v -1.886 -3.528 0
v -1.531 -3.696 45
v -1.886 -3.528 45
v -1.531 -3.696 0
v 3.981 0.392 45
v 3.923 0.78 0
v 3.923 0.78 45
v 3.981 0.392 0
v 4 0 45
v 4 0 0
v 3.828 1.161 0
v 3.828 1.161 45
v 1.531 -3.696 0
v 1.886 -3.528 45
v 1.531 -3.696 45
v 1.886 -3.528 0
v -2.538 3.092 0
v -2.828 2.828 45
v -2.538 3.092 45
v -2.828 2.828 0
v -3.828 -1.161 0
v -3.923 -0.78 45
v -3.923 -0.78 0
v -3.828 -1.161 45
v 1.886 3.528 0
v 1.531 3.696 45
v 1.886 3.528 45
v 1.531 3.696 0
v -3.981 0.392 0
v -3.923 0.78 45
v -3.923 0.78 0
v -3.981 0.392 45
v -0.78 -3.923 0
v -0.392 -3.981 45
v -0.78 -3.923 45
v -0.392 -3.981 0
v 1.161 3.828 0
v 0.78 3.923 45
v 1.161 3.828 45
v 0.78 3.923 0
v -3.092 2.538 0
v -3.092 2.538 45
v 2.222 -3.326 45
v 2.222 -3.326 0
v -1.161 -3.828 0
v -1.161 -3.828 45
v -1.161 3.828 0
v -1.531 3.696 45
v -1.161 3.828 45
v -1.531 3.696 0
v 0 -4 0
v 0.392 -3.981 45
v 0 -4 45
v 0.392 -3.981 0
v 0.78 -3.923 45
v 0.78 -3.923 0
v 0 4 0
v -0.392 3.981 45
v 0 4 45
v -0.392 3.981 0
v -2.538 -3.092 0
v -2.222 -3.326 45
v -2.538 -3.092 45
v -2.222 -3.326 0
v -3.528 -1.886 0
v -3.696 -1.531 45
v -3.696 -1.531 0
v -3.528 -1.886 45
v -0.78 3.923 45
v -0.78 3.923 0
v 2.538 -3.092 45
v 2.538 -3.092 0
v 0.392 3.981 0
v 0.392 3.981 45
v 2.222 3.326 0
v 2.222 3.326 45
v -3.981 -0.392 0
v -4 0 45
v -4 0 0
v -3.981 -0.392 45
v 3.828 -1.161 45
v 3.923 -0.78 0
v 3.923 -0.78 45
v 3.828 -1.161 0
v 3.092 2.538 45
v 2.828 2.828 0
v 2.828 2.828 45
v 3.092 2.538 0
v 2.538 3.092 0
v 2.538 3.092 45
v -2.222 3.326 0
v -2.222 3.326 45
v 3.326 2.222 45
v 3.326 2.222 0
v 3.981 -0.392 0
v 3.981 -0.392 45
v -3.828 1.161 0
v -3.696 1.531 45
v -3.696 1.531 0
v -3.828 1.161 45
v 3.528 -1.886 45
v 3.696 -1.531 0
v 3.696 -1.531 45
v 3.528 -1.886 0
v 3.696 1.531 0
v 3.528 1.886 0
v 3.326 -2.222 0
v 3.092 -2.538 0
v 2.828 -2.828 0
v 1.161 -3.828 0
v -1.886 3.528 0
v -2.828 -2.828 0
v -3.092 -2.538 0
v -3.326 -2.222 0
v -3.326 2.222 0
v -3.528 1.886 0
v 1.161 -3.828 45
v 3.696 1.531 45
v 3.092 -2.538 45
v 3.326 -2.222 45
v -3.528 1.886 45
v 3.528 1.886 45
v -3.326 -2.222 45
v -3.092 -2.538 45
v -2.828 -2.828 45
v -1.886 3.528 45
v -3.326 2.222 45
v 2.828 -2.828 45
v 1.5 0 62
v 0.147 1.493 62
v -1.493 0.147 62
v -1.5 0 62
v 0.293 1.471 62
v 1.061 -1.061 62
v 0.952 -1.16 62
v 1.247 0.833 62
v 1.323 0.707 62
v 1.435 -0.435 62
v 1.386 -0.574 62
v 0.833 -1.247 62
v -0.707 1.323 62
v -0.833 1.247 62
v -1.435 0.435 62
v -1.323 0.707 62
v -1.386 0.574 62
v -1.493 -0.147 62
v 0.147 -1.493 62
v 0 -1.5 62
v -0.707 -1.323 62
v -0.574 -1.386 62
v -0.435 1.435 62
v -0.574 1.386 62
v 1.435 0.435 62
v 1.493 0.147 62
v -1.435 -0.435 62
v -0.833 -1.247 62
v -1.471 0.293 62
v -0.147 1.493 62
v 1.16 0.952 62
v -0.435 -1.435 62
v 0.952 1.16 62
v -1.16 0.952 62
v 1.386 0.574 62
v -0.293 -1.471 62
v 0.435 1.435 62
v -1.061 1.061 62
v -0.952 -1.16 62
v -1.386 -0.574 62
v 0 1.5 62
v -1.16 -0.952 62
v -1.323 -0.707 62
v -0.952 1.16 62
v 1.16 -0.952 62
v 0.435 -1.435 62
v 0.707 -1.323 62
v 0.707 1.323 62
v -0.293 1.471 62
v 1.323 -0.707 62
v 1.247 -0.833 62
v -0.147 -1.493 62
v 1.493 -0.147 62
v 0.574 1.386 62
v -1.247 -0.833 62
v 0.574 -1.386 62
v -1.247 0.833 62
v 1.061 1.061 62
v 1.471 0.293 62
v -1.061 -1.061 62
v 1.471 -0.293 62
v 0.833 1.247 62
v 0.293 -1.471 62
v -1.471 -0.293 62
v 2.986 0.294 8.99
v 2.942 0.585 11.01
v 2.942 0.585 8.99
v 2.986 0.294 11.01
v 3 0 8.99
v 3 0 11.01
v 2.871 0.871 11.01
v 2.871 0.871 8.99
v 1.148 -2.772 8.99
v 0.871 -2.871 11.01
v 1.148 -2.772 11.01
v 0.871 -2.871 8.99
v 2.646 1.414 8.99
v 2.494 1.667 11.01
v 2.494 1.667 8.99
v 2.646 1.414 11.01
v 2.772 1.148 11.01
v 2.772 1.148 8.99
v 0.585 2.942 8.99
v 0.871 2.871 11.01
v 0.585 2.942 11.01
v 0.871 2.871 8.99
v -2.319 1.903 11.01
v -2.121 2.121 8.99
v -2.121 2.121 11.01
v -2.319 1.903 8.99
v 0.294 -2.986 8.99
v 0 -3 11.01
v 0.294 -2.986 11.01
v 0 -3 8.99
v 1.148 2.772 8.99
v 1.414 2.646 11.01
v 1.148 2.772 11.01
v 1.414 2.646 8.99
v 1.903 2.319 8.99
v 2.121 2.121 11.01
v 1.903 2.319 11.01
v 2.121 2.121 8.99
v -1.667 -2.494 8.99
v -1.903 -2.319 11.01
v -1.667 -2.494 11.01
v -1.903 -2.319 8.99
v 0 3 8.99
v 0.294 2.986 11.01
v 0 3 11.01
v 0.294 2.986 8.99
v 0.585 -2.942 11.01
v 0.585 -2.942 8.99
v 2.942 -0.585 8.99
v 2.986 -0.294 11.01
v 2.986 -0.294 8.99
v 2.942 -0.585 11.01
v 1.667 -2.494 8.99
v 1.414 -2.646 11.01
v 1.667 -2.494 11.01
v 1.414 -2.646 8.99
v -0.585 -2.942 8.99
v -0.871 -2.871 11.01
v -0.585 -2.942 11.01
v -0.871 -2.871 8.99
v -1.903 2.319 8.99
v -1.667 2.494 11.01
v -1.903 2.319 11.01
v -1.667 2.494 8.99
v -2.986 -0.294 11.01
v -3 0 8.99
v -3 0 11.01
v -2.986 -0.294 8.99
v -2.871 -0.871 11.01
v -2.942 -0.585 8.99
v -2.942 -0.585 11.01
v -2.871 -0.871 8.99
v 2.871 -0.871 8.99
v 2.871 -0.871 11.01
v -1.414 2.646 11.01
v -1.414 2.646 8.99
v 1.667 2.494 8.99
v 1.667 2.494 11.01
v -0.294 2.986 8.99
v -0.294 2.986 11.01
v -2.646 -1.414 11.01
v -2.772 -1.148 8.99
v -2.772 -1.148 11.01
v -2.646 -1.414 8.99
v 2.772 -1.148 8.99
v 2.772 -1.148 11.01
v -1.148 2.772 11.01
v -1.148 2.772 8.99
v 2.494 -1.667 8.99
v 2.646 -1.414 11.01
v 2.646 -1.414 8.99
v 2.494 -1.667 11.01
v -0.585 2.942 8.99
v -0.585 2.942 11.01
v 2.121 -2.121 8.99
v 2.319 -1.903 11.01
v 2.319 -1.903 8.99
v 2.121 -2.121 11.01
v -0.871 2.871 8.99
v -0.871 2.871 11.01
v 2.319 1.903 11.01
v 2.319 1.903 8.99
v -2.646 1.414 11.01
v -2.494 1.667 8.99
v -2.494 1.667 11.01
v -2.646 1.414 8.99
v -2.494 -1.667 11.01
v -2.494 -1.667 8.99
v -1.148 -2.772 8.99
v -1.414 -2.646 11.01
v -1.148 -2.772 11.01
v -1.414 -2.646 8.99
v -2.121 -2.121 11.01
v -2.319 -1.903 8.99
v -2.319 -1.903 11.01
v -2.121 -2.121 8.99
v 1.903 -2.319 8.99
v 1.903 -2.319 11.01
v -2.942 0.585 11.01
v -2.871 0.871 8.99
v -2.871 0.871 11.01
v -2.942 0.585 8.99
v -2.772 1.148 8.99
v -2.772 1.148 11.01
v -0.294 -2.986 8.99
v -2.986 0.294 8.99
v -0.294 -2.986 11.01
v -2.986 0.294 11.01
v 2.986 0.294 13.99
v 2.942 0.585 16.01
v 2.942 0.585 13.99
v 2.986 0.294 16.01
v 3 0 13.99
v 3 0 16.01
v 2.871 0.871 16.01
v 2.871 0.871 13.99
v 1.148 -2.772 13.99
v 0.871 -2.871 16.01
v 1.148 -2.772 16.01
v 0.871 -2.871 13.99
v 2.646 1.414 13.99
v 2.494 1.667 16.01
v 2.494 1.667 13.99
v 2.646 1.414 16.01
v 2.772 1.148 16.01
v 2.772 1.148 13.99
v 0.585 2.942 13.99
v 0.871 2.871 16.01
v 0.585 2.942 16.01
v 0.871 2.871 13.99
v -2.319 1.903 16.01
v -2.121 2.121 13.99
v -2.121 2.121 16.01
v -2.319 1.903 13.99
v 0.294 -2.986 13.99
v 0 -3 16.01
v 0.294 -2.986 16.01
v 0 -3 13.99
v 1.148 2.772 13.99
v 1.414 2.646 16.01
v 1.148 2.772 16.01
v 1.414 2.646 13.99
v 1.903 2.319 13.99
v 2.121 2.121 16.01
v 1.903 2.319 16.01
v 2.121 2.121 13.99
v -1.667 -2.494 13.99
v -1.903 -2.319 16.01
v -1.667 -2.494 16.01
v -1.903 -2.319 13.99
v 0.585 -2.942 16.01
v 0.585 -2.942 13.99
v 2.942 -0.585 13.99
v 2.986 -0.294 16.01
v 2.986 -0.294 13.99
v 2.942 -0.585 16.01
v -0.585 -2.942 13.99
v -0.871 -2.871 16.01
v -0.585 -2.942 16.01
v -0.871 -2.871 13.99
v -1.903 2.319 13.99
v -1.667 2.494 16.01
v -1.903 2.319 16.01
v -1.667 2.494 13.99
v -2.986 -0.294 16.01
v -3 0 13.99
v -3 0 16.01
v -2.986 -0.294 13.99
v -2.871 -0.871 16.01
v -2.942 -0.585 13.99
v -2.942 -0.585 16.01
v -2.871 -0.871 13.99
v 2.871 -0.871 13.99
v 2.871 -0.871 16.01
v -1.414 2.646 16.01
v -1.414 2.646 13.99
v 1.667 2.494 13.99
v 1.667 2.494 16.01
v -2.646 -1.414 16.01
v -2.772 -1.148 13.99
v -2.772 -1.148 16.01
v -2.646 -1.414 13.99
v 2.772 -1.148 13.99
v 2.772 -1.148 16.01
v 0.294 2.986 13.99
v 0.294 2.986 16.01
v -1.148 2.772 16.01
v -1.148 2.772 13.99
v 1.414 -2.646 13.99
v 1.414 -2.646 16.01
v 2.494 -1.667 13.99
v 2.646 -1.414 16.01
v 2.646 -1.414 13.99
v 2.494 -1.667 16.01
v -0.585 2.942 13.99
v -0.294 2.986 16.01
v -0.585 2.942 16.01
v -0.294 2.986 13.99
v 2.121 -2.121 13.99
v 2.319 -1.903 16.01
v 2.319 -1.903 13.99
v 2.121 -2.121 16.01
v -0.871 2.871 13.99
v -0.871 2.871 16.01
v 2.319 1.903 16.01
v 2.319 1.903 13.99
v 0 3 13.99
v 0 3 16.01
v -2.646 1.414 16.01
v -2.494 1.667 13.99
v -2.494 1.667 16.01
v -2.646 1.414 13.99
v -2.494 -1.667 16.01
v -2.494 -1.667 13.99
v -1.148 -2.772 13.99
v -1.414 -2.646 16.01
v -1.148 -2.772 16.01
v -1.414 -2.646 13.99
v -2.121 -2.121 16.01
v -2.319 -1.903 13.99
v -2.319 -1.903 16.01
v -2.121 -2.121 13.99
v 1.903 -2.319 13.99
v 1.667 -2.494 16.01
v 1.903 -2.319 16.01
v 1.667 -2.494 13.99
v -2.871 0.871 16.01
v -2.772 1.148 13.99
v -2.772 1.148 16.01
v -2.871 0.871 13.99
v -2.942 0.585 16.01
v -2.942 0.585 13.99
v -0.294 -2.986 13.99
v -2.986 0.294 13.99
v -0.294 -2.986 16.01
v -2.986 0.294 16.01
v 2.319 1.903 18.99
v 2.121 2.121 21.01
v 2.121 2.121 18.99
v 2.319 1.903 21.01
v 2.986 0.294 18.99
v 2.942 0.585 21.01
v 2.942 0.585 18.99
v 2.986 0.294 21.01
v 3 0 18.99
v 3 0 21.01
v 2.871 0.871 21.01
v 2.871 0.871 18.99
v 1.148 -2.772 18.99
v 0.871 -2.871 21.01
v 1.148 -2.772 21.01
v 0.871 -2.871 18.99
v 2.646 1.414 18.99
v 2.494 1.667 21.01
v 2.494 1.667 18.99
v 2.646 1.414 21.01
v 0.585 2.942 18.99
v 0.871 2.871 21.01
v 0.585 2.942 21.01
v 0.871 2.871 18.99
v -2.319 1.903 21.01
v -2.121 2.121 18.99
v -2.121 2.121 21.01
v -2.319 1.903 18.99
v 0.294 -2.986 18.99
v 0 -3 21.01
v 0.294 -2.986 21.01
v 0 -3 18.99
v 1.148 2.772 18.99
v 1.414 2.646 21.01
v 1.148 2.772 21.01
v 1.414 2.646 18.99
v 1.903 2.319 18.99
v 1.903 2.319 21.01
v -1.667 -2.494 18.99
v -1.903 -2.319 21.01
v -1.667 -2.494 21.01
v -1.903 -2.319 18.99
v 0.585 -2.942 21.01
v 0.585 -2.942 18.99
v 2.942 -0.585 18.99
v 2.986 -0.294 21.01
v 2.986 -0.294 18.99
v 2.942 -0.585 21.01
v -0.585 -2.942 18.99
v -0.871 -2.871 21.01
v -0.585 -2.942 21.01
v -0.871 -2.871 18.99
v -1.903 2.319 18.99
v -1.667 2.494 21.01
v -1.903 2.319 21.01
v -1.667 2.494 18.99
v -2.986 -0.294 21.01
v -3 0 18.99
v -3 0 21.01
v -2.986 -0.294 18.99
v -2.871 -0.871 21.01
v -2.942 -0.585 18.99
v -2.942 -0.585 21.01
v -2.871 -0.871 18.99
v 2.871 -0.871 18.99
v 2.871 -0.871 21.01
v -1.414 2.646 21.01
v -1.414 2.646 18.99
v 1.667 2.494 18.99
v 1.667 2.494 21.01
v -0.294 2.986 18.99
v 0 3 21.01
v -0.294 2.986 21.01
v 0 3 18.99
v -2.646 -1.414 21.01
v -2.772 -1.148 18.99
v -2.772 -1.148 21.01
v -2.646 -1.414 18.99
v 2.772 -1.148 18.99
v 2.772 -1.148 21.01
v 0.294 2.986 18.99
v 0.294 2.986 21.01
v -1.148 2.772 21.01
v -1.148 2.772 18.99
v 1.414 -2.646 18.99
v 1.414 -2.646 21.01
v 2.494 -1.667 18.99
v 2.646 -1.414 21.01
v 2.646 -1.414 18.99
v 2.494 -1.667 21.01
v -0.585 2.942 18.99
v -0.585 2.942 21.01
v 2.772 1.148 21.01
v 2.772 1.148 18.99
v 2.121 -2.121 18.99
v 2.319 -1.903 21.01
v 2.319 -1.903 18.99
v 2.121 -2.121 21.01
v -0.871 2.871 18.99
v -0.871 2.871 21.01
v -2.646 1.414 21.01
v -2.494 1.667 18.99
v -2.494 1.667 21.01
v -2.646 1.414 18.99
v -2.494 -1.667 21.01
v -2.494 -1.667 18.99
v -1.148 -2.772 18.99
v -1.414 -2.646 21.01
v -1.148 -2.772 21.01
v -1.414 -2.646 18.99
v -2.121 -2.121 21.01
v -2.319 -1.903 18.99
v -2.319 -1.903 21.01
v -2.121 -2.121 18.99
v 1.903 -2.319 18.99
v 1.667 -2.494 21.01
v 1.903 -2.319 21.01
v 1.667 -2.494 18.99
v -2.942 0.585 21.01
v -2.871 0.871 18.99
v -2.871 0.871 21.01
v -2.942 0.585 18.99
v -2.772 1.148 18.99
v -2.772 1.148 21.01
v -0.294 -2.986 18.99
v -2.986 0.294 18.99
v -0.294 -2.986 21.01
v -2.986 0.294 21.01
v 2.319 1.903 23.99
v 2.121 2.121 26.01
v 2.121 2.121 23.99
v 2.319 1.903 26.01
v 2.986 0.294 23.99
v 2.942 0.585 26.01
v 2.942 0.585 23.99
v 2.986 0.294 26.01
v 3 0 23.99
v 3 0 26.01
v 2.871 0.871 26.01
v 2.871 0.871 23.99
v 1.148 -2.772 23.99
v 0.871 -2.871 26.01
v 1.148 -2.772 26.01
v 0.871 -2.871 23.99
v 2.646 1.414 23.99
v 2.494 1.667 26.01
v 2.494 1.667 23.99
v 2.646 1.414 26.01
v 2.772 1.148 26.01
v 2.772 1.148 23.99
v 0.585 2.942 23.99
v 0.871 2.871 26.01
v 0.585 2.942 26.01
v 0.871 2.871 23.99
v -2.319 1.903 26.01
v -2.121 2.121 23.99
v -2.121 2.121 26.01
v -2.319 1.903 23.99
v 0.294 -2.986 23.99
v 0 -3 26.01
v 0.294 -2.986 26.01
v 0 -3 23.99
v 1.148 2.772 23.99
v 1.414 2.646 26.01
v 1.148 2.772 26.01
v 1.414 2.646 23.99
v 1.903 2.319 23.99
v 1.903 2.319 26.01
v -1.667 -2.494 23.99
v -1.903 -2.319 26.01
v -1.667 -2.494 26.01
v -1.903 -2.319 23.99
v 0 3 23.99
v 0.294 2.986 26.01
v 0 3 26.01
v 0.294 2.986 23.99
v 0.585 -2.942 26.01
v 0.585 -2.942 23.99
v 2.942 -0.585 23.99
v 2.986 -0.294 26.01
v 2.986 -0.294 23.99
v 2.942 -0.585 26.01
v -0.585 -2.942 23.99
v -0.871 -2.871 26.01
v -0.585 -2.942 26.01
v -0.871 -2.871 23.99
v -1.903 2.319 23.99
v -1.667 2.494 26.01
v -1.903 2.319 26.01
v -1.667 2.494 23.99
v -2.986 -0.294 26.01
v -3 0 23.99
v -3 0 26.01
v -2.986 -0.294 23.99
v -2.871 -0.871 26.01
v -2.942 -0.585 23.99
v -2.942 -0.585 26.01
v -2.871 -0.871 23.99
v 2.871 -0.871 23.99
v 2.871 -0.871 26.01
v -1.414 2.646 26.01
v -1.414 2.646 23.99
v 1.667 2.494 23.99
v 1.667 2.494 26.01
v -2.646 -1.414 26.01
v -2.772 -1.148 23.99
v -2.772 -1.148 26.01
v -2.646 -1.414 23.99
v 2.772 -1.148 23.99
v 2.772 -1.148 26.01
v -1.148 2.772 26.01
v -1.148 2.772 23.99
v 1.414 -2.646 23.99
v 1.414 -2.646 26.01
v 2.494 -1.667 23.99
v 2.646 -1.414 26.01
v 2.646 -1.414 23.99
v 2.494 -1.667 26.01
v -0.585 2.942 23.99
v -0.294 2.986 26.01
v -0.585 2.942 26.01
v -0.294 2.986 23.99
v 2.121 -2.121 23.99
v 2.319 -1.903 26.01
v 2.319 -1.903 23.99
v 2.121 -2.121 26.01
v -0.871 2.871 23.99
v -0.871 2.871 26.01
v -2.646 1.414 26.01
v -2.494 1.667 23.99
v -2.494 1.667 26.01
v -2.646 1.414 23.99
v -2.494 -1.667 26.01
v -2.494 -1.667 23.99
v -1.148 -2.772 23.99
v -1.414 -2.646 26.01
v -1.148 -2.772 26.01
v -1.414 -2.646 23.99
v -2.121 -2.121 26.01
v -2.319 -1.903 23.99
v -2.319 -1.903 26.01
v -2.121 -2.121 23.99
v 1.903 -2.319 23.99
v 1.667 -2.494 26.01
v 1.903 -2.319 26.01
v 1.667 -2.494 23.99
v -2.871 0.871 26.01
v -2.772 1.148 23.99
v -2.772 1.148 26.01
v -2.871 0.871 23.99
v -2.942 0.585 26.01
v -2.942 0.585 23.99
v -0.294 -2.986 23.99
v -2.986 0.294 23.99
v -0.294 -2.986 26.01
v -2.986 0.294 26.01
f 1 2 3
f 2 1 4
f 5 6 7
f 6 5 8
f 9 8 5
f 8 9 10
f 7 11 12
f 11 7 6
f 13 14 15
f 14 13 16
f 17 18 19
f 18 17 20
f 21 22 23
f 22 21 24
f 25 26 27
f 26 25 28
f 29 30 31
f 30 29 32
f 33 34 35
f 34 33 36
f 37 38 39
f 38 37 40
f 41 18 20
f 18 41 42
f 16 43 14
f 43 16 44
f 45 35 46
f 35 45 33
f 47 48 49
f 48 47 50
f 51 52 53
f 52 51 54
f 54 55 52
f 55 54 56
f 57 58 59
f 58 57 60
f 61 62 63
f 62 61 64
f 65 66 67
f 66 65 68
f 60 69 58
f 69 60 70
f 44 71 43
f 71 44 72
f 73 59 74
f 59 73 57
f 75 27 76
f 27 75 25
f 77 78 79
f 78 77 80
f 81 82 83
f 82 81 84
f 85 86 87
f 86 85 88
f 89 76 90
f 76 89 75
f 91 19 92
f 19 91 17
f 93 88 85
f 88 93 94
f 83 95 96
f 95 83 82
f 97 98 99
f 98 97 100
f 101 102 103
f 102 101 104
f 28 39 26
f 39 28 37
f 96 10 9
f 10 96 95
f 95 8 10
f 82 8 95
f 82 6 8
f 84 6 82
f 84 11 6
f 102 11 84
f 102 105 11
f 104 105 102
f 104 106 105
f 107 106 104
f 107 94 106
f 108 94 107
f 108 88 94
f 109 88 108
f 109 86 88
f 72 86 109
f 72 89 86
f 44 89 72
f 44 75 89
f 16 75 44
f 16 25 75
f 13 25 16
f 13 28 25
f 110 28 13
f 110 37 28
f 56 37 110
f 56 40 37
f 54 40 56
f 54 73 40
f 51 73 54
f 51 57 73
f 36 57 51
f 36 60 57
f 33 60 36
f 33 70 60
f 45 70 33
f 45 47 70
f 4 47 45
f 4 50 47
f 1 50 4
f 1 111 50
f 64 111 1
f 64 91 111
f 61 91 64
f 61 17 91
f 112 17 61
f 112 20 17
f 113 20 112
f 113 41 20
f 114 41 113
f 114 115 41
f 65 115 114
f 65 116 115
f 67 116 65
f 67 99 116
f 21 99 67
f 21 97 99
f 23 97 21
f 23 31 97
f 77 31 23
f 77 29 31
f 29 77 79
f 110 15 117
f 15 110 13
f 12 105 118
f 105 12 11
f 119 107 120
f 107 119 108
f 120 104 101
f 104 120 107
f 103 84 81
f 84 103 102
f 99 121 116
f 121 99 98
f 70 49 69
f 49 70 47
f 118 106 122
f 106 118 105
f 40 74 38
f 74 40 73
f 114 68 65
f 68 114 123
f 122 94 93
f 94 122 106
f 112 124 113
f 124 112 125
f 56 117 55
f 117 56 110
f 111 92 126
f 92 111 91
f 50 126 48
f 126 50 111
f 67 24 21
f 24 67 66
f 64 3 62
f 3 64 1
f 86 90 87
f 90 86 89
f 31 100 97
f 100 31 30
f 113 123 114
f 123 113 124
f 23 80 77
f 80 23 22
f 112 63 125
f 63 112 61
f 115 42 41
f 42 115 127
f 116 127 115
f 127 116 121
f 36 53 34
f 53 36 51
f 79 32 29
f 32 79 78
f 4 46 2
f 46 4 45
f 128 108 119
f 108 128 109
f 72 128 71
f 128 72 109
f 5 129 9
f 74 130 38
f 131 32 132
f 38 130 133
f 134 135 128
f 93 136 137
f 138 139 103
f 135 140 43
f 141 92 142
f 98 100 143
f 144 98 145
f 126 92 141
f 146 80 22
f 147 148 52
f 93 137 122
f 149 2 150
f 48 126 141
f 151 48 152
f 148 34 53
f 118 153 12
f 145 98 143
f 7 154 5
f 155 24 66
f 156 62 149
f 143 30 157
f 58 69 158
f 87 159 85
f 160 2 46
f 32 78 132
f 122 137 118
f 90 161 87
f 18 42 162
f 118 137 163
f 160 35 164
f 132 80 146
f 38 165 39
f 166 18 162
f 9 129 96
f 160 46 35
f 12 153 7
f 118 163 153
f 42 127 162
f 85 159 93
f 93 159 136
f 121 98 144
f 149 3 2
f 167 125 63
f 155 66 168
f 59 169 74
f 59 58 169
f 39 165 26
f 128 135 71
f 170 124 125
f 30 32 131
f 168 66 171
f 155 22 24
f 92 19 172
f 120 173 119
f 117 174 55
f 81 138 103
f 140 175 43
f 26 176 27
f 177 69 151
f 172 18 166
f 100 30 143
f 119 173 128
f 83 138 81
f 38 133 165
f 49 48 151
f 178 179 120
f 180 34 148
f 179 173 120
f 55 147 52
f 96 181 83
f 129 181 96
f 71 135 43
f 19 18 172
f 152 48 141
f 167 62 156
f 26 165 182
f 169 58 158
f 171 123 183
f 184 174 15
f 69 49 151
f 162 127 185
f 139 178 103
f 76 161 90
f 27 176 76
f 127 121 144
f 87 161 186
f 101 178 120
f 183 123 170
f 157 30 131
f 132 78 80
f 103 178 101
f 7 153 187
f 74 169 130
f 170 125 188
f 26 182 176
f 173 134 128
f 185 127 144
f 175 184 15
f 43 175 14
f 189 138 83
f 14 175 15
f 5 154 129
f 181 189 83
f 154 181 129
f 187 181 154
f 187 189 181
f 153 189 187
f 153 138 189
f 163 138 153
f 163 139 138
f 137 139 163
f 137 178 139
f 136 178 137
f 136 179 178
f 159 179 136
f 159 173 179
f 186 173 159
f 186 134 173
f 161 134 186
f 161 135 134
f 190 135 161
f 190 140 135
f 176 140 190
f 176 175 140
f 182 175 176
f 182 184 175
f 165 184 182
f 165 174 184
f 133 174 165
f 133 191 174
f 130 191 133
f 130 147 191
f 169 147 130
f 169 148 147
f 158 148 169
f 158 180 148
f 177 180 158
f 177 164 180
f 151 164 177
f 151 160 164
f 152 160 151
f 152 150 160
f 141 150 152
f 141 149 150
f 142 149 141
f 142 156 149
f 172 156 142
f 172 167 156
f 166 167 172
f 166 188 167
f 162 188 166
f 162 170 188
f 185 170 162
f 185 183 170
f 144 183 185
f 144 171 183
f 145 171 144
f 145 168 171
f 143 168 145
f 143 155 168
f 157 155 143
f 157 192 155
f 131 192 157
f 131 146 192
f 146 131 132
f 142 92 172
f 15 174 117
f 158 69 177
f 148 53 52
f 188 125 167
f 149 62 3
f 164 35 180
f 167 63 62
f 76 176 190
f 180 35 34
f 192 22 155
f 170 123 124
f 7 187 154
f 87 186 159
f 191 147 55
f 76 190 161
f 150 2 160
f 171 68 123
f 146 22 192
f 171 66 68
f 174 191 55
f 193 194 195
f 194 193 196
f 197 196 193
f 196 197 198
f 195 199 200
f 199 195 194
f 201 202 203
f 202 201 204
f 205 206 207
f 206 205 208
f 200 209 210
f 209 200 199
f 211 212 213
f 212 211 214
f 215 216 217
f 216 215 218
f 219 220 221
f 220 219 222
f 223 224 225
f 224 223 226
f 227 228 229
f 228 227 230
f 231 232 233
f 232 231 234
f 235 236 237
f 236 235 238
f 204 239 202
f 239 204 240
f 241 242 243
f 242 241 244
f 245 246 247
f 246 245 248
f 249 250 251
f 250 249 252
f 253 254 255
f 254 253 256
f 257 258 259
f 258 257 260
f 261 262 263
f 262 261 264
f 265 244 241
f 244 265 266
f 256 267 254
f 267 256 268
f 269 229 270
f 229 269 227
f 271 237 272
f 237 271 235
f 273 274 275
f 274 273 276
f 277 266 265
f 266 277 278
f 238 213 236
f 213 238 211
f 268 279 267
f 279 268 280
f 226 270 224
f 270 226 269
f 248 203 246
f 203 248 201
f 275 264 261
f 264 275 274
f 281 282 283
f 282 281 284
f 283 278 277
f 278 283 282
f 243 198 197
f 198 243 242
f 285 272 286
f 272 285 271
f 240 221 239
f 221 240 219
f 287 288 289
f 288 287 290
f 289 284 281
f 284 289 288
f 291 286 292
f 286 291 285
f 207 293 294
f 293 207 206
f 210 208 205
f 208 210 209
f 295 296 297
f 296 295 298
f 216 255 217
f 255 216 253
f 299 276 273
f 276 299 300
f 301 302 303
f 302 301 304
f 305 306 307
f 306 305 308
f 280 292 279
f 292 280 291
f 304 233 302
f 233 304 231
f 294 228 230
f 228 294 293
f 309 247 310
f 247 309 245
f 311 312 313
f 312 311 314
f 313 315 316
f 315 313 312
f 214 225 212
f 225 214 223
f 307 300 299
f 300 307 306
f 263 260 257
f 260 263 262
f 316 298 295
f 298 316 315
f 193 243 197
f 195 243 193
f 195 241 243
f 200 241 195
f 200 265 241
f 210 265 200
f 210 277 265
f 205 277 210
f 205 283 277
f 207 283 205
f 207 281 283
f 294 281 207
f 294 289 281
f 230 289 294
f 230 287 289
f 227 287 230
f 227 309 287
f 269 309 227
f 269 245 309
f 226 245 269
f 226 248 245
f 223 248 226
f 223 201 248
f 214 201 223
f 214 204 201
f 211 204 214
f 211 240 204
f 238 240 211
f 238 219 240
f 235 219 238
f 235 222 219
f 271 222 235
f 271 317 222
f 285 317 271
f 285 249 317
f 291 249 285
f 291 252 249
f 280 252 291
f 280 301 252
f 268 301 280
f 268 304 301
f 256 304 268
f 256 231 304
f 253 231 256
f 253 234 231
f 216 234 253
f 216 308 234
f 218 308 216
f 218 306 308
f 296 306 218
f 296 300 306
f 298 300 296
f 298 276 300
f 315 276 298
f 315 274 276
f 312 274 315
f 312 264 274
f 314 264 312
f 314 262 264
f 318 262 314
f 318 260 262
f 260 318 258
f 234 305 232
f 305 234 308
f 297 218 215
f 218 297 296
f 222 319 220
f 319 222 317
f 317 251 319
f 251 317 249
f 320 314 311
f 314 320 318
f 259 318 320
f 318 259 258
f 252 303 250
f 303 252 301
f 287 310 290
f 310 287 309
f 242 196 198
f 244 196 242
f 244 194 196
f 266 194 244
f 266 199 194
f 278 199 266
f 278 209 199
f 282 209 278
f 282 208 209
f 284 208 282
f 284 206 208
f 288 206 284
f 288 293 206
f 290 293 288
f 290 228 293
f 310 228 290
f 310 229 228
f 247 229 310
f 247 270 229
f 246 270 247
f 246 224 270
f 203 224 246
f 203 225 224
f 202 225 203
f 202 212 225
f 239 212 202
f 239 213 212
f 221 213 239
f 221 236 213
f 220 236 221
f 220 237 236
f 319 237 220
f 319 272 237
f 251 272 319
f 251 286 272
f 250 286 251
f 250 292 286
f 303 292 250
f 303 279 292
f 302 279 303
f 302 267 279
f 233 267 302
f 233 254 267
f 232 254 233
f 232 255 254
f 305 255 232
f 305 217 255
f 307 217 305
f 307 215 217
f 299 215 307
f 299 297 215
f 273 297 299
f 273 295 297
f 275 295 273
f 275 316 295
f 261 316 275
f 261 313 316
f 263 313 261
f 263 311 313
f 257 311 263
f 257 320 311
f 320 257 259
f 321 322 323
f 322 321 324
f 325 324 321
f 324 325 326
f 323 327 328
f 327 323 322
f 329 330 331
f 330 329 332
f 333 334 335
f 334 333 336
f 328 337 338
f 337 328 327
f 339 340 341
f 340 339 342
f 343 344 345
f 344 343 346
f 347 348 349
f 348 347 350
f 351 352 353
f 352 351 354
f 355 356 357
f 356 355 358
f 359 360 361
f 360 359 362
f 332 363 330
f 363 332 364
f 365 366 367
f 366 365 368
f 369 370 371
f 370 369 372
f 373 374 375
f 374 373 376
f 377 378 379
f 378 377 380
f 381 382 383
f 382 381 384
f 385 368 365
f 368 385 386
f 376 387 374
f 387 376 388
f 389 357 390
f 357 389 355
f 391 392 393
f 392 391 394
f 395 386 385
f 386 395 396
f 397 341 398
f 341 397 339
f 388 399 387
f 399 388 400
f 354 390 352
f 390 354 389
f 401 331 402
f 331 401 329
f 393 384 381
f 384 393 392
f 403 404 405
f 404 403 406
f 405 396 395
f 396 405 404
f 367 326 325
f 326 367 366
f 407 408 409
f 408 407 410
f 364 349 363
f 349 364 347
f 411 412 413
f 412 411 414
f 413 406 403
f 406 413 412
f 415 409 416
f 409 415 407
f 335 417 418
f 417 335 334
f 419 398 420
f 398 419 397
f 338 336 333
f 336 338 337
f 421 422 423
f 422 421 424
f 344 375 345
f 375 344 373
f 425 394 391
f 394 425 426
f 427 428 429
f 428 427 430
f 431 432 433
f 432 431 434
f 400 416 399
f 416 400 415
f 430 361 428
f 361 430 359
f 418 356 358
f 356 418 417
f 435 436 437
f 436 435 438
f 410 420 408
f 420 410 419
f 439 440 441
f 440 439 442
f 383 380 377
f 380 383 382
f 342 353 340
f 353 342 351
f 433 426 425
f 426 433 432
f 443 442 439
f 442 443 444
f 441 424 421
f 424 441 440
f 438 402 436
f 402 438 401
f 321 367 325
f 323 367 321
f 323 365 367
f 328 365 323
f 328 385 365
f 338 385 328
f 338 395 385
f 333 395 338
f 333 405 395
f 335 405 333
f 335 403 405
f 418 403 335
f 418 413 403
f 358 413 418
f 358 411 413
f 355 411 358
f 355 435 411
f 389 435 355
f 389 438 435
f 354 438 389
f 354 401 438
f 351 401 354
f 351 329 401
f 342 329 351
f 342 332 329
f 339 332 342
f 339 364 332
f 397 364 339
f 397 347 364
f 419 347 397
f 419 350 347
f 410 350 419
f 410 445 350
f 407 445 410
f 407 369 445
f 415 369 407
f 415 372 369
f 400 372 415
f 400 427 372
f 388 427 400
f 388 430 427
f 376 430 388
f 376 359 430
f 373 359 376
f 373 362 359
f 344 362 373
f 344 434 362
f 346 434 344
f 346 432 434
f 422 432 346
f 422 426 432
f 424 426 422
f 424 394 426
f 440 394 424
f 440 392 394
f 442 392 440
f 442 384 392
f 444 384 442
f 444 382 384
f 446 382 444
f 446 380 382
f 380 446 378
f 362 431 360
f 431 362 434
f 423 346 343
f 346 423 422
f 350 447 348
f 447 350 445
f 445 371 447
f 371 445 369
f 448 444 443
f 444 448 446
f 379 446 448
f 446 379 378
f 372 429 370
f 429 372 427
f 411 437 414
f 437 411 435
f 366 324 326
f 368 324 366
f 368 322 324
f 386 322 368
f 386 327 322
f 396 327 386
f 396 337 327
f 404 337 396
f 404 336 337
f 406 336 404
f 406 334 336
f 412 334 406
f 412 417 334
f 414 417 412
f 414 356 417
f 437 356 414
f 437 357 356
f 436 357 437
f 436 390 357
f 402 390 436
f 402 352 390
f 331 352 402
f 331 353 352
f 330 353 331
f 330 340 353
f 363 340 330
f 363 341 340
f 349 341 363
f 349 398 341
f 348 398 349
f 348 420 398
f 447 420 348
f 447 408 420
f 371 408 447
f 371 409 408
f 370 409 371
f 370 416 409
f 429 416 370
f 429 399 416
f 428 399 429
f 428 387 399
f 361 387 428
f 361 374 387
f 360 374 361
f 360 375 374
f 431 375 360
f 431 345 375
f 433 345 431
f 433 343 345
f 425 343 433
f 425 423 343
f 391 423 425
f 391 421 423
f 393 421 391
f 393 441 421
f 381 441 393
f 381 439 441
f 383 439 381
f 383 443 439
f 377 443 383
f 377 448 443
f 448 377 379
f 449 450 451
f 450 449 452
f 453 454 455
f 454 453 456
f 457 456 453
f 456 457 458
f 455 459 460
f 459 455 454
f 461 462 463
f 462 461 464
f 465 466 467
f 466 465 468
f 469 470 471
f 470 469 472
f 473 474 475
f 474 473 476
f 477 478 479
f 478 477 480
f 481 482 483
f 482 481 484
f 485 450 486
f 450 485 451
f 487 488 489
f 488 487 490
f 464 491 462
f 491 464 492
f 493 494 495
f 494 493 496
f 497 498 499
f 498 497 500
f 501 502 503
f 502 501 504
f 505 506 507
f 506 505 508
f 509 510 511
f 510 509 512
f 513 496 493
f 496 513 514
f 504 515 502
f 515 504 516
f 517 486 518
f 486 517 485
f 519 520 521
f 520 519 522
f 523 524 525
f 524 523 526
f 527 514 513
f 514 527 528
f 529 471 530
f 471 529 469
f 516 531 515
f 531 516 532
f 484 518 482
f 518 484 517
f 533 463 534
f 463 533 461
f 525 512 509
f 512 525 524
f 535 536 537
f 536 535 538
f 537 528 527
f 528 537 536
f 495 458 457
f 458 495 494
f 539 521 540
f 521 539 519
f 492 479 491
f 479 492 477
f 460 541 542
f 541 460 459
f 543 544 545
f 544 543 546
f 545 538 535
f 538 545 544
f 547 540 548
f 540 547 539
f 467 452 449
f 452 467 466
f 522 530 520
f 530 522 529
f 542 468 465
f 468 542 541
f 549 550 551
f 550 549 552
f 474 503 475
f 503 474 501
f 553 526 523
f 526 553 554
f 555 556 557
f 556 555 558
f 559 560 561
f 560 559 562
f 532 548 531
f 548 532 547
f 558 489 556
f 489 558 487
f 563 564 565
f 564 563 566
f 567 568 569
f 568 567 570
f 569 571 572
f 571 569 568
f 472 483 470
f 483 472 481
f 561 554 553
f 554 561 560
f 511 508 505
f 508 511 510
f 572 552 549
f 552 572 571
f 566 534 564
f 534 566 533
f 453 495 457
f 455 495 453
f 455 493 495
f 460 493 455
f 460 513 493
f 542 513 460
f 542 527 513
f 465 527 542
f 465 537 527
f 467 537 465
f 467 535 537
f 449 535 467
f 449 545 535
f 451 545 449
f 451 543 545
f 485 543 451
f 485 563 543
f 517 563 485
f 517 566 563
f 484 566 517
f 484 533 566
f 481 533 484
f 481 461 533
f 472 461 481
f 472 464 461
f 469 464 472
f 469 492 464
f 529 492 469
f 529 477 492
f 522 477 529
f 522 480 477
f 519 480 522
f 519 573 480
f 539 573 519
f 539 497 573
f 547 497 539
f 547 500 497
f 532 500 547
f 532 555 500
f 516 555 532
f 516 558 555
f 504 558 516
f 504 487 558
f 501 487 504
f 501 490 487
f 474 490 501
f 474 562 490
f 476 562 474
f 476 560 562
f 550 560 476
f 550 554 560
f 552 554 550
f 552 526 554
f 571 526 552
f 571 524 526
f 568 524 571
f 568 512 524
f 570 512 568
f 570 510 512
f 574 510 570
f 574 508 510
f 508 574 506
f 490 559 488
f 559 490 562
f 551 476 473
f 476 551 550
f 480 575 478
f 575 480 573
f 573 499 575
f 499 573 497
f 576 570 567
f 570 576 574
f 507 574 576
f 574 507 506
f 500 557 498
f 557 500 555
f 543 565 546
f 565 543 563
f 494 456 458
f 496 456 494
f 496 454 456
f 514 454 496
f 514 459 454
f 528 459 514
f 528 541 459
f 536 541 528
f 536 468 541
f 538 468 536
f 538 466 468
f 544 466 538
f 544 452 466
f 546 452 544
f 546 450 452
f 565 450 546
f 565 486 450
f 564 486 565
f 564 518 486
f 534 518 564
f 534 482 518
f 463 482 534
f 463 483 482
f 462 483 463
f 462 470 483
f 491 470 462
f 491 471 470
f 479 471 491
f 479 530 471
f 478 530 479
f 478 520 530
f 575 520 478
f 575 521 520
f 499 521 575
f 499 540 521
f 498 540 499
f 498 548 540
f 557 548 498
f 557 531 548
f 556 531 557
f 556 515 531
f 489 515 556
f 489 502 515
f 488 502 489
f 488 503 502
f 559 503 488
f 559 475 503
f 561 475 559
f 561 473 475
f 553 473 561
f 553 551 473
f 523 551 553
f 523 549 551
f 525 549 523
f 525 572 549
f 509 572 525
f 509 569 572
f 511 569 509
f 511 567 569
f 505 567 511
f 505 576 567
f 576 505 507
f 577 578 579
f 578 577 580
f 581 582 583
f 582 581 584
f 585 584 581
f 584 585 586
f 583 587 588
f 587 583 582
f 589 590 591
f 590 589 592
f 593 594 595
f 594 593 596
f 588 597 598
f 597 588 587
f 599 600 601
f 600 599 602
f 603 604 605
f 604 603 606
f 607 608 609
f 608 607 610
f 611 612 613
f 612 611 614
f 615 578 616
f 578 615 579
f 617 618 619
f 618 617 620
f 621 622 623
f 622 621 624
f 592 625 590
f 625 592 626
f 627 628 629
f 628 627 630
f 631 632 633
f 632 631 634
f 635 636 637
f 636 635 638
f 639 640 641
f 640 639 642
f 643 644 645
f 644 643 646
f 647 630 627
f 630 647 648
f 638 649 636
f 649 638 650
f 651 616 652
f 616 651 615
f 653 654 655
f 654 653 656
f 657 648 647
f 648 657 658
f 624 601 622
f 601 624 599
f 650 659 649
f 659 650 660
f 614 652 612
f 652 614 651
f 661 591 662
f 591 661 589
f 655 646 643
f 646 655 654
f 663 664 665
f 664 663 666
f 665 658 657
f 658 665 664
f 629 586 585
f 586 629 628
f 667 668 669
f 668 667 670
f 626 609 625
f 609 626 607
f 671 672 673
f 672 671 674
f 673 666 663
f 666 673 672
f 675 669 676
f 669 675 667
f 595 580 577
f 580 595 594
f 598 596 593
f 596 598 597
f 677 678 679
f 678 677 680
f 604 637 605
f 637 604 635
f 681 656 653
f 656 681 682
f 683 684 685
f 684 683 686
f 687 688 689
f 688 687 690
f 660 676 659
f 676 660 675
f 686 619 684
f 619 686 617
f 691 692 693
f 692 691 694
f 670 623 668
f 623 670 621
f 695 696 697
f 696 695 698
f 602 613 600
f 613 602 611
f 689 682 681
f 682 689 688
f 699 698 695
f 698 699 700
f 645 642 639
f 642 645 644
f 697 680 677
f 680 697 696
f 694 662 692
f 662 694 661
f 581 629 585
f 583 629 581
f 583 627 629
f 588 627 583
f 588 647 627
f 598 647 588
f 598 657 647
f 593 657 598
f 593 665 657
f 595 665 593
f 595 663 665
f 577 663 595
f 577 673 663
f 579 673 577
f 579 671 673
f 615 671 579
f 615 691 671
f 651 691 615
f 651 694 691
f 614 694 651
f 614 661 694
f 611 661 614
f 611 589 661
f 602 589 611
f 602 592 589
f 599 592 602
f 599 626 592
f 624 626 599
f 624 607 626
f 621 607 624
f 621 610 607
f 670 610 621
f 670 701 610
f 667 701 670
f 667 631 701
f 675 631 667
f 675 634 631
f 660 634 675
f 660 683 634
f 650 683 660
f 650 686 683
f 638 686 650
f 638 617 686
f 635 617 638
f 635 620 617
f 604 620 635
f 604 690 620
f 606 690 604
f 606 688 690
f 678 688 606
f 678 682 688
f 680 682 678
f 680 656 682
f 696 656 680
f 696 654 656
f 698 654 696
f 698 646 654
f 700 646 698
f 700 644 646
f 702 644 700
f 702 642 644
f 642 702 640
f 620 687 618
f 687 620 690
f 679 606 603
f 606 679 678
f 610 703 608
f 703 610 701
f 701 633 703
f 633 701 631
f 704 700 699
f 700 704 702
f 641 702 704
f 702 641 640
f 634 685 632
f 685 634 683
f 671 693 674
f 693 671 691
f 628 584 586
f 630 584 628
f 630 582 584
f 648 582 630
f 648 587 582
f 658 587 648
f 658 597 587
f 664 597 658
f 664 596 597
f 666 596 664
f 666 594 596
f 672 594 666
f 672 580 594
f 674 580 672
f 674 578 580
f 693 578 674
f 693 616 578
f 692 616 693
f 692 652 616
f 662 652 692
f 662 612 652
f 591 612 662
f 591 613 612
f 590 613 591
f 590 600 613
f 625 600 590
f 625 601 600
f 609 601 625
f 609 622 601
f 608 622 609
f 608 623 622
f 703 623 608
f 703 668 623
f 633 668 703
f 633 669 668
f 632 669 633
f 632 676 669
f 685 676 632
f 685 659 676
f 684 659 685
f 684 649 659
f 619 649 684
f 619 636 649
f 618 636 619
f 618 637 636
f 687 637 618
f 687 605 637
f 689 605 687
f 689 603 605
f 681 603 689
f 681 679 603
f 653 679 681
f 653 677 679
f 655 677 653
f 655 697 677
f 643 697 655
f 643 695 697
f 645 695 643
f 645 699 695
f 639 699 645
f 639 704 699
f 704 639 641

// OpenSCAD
// Pestle for 1.5 mL microcentrifuge tube - printed standing upright on XY plane.

// Dimensions
handle_d = 8;
handle_z_start = 0;
handle_z_end = 45;
cone_z_start = 45;
cone_z_end = 62;
tip_d = 3;
tip_center_z = 62;
groove_count = 4;
groove_width = 2;
groove_depth = 1;
groove_z_centers = [10, 15, 20, 25];

$fn = 64;

// Main body construction
difference() {
    union() {
        // 1. Cylindrical handle
        cylinder(h = handle_z_end - handle_z_start, d = handle_d);
        
        // 2. Conical taper
        translate([0, 0, cone_z_start]) 
            cylinder(h = cone_z_end - cone_z_start, d1 = handle_d, d2 = tip_d);
        
        // 3. Rounded tip (sphere centered at tip_center_z)
        translate([0, 0, tip_center_z - tip_d / 2]) 
            sphere(d = tip_d);
    }
    
    // 4. Cut grooves
    for (z = groove_z_centers) {
        translate([0, 0, z - groove_width / 2]) {
            // Cut a ring segment: cylinder with a hole in the middle
            // The hole diameter is (handle_d - 2 * groove_depth)
            hole_d = handle_d - 2 * groove_depth;
            translate([0, 0, -0.01]) cylinder(h = groove_width + 0.02, d = hole_d);
        }
    }
}
